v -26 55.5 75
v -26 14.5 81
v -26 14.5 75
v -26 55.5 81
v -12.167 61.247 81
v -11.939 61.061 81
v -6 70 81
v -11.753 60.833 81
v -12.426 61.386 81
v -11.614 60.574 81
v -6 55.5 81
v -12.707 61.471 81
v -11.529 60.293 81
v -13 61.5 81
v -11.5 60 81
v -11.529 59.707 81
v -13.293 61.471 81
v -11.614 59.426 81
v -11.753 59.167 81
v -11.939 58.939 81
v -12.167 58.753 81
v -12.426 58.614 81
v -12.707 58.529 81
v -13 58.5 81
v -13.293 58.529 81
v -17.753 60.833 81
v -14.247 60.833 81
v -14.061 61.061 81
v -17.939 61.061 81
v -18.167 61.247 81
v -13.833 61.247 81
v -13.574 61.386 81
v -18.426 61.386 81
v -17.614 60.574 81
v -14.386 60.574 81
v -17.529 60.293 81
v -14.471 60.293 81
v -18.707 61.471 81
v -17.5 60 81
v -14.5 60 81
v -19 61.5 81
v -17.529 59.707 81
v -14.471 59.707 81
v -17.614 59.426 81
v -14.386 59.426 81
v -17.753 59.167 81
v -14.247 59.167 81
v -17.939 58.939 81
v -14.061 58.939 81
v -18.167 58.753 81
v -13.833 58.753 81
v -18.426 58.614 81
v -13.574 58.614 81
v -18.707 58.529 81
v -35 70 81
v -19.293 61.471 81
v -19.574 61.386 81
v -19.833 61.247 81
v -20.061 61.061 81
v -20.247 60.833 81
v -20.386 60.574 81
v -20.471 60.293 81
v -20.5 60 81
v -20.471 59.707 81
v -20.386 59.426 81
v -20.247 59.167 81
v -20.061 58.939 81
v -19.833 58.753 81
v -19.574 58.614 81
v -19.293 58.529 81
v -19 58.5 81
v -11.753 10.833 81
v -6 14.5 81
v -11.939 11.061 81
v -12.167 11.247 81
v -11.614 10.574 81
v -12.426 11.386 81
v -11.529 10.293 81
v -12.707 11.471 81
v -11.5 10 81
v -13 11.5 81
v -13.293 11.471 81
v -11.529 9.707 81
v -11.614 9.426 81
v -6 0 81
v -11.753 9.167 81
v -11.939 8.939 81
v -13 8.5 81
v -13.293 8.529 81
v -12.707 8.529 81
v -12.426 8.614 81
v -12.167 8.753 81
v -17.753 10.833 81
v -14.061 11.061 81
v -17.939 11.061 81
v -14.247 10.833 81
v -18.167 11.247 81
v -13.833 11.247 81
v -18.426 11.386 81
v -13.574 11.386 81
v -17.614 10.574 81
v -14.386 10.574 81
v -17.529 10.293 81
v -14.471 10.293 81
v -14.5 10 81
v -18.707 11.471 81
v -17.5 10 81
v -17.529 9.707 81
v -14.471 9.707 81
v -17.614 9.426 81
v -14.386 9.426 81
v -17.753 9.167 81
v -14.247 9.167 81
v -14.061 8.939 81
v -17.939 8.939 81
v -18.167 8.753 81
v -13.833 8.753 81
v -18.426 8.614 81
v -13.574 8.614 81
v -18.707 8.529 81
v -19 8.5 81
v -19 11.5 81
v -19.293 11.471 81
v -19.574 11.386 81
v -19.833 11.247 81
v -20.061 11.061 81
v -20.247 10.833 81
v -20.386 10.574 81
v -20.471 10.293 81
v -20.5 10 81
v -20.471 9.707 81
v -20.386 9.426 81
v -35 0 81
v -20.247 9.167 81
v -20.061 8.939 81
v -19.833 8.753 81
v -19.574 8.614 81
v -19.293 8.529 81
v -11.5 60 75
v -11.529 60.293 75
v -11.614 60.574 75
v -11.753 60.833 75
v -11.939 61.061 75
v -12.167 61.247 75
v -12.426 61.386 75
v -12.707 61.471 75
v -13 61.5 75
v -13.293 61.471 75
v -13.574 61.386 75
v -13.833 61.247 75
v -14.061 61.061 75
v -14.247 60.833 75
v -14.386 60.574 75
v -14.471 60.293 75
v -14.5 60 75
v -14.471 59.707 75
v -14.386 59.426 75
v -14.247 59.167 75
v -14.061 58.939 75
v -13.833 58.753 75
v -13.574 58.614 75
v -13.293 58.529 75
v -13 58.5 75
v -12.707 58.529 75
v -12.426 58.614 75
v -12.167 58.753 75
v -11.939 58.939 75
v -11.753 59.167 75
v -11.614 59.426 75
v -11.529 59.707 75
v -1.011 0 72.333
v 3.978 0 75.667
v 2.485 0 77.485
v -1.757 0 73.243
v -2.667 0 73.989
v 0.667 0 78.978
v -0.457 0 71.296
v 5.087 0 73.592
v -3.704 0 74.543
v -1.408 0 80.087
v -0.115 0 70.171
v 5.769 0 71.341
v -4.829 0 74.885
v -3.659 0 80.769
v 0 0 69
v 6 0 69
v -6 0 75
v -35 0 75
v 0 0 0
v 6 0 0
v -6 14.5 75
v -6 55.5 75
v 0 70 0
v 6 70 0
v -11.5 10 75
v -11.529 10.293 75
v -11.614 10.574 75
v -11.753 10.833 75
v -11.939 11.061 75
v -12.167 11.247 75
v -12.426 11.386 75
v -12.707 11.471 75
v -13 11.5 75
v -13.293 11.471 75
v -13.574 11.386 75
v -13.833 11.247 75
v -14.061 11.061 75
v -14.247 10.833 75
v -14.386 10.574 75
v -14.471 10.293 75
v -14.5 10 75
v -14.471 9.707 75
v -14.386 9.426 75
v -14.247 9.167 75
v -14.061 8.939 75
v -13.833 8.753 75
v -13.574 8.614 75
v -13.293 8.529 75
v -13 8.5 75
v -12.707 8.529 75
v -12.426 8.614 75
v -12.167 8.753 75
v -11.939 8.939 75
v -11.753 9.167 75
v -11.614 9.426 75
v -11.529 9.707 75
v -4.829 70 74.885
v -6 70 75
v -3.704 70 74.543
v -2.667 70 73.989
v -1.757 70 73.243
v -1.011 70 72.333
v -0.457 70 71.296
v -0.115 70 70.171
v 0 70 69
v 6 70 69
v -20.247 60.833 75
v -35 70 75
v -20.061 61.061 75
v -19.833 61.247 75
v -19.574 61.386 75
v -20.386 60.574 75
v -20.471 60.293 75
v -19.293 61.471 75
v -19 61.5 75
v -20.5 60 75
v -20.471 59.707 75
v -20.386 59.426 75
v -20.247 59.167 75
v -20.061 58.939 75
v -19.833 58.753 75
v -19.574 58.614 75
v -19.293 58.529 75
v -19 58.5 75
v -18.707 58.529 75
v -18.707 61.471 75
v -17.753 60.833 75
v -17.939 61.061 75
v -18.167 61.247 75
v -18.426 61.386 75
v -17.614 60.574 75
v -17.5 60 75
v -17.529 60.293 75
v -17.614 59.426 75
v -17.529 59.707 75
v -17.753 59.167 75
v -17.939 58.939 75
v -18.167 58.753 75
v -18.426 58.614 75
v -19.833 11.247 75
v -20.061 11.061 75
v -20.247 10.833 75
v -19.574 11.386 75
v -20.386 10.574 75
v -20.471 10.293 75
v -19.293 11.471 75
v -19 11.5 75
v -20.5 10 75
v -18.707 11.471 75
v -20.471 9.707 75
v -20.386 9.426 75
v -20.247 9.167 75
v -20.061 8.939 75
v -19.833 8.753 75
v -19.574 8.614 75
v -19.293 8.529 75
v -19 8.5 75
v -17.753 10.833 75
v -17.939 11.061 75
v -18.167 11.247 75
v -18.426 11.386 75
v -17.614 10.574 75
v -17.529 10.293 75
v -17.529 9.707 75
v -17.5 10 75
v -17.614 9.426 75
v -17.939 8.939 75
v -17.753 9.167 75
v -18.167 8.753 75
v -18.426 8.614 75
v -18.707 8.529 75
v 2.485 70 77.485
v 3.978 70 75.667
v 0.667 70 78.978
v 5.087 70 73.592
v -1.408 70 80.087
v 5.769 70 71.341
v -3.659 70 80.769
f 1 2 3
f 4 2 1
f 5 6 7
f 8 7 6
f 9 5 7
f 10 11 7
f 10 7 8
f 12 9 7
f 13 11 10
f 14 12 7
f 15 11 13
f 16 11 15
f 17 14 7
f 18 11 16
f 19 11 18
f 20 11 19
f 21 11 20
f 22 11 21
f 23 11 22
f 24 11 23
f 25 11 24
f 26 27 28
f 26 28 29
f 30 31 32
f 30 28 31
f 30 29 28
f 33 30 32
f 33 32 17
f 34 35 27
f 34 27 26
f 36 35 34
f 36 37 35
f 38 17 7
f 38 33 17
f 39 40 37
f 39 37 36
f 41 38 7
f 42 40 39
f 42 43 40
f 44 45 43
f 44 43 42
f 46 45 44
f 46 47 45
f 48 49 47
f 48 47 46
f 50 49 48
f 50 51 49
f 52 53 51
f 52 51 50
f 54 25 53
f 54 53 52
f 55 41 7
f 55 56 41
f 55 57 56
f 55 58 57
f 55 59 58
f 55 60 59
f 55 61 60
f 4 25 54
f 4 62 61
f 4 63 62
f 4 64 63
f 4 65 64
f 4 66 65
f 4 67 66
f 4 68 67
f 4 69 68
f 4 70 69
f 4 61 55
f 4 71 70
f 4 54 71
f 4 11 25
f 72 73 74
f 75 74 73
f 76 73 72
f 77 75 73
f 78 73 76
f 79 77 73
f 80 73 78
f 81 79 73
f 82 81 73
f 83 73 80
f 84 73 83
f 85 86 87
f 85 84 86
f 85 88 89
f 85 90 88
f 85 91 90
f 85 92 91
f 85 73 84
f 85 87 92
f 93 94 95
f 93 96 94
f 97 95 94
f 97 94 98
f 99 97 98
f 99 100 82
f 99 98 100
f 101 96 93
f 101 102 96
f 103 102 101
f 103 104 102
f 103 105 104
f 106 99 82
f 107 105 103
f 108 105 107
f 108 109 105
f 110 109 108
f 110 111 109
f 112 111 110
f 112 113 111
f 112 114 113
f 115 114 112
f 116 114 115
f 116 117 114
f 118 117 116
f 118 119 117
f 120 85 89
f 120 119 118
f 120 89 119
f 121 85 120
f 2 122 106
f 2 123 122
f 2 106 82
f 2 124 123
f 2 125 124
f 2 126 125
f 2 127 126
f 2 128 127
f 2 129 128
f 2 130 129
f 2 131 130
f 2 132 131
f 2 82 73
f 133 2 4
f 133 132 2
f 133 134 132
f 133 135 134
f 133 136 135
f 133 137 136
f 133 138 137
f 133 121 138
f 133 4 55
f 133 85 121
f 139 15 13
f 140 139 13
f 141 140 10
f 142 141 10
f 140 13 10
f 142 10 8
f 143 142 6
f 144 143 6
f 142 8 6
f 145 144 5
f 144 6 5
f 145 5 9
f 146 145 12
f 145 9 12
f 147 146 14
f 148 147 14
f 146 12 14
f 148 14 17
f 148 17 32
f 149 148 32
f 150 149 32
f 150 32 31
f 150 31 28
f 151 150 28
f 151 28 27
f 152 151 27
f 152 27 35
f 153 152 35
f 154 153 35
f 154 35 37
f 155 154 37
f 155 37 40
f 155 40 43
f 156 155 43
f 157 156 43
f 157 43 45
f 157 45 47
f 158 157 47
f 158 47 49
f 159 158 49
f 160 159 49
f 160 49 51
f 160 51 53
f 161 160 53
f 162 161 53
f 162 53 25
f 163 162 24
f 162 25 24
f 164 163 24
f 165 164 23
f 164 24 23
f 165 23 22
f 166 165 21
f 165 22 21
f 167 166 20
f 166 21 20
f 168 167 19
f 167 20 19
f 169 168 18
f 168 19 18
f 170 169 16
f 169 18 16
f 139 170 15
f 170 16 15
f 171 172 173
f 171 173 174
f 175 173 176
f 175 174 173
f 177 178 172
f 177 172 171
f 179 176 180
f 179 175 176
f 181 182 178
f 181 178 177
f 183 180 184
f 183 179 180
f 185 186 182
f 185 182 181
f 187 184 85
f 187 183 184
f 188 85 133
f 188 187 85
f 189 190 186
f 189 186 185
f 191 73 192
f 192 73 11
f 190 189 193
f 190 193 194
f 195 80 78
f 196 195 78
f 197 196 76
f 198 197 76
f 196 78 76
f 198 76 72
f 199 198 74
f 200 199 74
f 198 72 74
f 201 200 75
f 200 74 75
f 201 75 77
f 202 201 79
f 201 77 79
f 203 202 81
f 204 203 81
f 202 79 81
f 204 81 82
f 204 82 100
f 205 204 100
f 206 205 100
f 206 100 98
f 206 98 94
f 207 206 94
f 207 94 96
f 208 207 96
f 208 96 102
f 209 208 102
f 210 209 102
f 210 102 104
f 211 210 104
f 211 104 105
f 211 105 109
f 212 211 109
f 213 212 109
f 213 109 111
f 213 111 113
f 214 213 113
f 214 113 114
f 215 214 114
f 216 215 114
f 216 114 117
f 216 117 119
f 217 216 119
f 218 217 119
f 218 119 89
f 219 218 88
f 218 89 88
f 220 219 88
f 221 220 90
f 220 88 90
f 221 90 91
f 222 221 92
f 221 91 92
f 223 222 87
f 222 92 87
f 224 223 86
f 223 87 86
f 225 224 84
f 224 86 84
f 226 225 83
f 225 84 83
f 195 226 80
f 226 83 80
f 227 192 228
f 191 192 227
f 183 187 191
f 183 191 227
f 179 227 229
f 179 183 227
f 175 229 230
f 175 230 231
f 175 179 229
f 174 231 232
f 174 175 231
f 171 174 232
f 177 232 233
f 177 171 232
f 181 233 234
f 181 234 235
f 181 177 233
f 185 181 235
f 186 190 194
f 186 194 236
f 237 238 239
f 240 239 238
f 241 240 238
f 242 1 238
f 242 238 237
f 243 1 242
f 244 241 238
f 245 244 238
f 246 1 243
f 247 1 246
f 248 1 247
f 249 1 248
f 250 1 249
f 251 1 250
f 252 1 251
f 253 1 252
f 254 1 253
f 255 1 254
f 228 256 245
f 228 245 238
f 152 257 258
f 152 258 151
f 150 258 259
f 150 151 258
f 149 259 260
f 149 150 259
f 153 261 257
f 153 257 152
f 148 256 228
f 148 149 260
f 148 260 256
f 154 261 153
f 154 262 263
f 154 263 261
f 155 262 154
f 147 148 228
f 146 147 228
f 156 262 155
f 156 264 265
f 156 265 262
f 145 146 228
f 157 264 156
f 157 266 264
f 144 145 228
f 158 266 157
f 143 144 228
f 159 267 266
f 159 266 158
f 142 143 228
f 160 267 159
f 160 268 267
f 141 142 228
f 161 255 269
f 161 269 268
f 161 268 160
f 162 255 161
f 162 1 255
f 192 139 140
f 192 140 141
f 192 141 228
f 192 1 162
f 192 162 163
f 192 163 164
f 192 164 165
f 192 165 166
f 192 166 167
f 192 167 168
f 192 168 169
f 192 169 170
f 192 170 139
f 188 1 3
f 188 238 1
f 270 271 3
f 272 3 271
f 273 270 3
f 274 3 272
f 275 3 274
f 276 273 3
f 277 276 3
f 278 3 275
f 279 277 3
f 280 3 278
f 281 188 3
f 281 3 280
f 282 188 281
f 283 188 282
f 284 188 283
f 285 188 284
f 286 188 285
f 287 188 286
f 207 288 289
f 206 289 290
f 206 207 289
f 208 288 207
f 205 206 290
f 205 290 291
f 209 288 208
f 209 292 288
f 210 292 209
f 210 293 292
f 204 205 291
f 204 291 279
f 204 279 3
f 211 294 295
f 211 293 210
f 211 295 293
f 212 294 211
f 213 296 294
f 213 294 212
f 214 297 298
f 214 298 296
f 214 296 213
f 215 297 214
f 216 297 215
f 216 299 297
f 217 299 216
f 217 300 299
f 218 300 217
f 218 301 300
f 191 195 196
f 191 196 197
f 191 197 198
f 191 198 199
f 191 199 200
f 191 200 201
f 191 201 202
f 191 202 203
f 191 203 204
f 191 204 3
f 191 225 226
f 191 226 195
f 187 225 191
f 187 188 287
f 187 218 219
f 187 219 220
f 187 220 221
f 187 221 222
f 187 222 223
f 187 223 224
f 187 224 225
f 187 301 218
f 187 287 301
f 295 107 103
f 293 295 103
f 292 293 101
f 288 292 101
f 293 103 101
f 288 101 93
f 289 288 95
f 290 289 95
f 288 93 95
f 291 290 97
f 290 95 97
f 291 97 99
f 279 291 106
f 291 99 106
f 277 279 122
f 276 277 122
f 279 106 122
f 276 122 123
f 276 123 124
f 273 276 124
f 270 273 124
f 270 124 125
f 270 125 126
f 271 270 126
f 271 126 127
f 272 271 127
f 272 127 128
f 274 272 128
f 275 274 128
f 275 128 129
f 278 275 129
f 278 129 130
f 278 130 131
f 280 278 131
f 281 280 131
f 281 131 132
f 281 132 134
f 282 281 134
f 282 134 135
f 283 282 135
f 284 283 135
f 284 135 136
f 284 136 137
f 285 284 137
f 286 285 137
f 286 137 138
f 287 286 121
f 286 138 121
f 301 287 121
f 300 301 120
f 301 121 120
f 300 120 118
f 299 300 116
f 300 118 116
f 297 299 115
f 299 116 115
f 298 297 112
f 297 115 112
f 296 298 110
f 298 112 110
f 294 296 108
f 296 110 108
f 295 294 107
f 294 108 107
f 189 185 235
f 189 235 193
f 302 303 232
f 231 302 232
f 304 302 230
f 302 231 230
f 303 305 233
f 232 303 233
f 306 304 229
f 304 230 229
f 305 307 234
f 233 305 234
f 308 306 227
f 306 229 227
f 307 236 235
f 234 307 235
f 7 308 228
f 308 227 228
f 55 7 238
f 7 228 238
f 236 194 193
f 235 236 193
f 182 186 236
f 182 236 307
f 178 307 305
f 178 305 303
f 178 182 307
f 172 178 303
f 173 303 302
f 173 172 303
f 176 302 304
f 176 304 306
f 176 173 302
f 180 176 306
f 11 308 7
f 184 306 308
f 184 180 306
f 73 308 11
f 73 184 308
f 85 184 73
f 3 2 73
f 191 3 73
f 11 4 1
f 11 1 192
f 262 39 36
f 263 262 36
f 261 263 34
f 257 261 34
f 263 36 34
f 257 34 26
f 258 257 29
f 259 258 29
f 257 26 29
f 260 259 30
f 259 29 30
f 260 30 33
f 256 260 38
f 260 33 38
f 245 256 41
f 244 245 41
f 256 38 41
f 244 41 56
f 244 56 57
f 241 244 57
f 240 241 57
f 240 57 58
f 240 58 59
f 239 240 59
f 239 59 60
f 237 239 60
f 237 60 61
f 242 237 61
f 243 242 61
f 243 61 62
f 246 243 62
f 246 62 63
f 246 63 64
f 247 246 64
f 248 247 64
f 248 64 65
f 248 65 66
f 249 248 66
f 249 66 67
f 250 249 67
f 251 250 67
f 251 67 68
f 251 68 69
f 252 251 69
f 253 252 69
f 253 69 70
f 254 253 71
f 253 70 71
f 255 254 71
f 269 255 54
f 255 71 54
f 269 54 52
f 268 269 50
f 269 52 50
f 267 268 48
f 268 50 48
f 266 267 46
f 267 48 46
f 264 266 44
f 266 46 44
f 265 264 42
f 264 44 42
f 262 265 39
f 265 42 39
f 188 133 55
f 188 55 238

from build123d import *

# Parameters (mm, degrees)
BOSS_EXTRUDE1_DEPTH = 70
SKETCH3_R           = 1.5
SKETCH3_W           = 20
SKETCH3_H           = 41
CUT_EXTRUDE1_DEPTH  = 50


with BuildPart() as part:
    # Sketch2 → Boss-Extrude1 (new body)
    with BuildSketch(Plane(origin=(0, 0, 0), x_dir=(1, 0, 0), z_dir=(0, 1, 0))):
        with BuildLine():
            ThreePointArc((6, -69), (2.485281374, -77.485281374), (-6, -81))
            Line((-6, -81), (-35, -81))
            Line((-35, -81), (-35, -75))
            Line((-35, -75), (-6, -75))
            ThreePointArc((-6, -75), (-1.757359313, -73.242640687), (0, -69))
            Line((0, -69), (0, 0))
            Line((0, 0), (6, 0))
            Line((6, 0), (6, -69))
        make_face()
    extrude(amount=BOSS_EXTRUDE1_DEPTH)

    # Sketch3 → Cut-Extrude1 (cut)
    with BuildSketch(Plane.XY.offset(81)):
        with Locations((-19, 60)):
            Circle(SKETCH3_R)
        with Locations((-13, 60)):
            Circle(SKETCH3_R)
        with Locations((-13, 10)):
            Circle(SKETCH3_R)
        with Locations((-19, 10)):
            Circle(SKETCH3_R)
        with Locations((-16, 35)):
            Rectangle(SKETCH3_W, SKETCH3_H)
    extrude(amount=-CUT_EXTRUDE1_DEPTH, mode=Mode.SUBTRACT)


solid = part.part
